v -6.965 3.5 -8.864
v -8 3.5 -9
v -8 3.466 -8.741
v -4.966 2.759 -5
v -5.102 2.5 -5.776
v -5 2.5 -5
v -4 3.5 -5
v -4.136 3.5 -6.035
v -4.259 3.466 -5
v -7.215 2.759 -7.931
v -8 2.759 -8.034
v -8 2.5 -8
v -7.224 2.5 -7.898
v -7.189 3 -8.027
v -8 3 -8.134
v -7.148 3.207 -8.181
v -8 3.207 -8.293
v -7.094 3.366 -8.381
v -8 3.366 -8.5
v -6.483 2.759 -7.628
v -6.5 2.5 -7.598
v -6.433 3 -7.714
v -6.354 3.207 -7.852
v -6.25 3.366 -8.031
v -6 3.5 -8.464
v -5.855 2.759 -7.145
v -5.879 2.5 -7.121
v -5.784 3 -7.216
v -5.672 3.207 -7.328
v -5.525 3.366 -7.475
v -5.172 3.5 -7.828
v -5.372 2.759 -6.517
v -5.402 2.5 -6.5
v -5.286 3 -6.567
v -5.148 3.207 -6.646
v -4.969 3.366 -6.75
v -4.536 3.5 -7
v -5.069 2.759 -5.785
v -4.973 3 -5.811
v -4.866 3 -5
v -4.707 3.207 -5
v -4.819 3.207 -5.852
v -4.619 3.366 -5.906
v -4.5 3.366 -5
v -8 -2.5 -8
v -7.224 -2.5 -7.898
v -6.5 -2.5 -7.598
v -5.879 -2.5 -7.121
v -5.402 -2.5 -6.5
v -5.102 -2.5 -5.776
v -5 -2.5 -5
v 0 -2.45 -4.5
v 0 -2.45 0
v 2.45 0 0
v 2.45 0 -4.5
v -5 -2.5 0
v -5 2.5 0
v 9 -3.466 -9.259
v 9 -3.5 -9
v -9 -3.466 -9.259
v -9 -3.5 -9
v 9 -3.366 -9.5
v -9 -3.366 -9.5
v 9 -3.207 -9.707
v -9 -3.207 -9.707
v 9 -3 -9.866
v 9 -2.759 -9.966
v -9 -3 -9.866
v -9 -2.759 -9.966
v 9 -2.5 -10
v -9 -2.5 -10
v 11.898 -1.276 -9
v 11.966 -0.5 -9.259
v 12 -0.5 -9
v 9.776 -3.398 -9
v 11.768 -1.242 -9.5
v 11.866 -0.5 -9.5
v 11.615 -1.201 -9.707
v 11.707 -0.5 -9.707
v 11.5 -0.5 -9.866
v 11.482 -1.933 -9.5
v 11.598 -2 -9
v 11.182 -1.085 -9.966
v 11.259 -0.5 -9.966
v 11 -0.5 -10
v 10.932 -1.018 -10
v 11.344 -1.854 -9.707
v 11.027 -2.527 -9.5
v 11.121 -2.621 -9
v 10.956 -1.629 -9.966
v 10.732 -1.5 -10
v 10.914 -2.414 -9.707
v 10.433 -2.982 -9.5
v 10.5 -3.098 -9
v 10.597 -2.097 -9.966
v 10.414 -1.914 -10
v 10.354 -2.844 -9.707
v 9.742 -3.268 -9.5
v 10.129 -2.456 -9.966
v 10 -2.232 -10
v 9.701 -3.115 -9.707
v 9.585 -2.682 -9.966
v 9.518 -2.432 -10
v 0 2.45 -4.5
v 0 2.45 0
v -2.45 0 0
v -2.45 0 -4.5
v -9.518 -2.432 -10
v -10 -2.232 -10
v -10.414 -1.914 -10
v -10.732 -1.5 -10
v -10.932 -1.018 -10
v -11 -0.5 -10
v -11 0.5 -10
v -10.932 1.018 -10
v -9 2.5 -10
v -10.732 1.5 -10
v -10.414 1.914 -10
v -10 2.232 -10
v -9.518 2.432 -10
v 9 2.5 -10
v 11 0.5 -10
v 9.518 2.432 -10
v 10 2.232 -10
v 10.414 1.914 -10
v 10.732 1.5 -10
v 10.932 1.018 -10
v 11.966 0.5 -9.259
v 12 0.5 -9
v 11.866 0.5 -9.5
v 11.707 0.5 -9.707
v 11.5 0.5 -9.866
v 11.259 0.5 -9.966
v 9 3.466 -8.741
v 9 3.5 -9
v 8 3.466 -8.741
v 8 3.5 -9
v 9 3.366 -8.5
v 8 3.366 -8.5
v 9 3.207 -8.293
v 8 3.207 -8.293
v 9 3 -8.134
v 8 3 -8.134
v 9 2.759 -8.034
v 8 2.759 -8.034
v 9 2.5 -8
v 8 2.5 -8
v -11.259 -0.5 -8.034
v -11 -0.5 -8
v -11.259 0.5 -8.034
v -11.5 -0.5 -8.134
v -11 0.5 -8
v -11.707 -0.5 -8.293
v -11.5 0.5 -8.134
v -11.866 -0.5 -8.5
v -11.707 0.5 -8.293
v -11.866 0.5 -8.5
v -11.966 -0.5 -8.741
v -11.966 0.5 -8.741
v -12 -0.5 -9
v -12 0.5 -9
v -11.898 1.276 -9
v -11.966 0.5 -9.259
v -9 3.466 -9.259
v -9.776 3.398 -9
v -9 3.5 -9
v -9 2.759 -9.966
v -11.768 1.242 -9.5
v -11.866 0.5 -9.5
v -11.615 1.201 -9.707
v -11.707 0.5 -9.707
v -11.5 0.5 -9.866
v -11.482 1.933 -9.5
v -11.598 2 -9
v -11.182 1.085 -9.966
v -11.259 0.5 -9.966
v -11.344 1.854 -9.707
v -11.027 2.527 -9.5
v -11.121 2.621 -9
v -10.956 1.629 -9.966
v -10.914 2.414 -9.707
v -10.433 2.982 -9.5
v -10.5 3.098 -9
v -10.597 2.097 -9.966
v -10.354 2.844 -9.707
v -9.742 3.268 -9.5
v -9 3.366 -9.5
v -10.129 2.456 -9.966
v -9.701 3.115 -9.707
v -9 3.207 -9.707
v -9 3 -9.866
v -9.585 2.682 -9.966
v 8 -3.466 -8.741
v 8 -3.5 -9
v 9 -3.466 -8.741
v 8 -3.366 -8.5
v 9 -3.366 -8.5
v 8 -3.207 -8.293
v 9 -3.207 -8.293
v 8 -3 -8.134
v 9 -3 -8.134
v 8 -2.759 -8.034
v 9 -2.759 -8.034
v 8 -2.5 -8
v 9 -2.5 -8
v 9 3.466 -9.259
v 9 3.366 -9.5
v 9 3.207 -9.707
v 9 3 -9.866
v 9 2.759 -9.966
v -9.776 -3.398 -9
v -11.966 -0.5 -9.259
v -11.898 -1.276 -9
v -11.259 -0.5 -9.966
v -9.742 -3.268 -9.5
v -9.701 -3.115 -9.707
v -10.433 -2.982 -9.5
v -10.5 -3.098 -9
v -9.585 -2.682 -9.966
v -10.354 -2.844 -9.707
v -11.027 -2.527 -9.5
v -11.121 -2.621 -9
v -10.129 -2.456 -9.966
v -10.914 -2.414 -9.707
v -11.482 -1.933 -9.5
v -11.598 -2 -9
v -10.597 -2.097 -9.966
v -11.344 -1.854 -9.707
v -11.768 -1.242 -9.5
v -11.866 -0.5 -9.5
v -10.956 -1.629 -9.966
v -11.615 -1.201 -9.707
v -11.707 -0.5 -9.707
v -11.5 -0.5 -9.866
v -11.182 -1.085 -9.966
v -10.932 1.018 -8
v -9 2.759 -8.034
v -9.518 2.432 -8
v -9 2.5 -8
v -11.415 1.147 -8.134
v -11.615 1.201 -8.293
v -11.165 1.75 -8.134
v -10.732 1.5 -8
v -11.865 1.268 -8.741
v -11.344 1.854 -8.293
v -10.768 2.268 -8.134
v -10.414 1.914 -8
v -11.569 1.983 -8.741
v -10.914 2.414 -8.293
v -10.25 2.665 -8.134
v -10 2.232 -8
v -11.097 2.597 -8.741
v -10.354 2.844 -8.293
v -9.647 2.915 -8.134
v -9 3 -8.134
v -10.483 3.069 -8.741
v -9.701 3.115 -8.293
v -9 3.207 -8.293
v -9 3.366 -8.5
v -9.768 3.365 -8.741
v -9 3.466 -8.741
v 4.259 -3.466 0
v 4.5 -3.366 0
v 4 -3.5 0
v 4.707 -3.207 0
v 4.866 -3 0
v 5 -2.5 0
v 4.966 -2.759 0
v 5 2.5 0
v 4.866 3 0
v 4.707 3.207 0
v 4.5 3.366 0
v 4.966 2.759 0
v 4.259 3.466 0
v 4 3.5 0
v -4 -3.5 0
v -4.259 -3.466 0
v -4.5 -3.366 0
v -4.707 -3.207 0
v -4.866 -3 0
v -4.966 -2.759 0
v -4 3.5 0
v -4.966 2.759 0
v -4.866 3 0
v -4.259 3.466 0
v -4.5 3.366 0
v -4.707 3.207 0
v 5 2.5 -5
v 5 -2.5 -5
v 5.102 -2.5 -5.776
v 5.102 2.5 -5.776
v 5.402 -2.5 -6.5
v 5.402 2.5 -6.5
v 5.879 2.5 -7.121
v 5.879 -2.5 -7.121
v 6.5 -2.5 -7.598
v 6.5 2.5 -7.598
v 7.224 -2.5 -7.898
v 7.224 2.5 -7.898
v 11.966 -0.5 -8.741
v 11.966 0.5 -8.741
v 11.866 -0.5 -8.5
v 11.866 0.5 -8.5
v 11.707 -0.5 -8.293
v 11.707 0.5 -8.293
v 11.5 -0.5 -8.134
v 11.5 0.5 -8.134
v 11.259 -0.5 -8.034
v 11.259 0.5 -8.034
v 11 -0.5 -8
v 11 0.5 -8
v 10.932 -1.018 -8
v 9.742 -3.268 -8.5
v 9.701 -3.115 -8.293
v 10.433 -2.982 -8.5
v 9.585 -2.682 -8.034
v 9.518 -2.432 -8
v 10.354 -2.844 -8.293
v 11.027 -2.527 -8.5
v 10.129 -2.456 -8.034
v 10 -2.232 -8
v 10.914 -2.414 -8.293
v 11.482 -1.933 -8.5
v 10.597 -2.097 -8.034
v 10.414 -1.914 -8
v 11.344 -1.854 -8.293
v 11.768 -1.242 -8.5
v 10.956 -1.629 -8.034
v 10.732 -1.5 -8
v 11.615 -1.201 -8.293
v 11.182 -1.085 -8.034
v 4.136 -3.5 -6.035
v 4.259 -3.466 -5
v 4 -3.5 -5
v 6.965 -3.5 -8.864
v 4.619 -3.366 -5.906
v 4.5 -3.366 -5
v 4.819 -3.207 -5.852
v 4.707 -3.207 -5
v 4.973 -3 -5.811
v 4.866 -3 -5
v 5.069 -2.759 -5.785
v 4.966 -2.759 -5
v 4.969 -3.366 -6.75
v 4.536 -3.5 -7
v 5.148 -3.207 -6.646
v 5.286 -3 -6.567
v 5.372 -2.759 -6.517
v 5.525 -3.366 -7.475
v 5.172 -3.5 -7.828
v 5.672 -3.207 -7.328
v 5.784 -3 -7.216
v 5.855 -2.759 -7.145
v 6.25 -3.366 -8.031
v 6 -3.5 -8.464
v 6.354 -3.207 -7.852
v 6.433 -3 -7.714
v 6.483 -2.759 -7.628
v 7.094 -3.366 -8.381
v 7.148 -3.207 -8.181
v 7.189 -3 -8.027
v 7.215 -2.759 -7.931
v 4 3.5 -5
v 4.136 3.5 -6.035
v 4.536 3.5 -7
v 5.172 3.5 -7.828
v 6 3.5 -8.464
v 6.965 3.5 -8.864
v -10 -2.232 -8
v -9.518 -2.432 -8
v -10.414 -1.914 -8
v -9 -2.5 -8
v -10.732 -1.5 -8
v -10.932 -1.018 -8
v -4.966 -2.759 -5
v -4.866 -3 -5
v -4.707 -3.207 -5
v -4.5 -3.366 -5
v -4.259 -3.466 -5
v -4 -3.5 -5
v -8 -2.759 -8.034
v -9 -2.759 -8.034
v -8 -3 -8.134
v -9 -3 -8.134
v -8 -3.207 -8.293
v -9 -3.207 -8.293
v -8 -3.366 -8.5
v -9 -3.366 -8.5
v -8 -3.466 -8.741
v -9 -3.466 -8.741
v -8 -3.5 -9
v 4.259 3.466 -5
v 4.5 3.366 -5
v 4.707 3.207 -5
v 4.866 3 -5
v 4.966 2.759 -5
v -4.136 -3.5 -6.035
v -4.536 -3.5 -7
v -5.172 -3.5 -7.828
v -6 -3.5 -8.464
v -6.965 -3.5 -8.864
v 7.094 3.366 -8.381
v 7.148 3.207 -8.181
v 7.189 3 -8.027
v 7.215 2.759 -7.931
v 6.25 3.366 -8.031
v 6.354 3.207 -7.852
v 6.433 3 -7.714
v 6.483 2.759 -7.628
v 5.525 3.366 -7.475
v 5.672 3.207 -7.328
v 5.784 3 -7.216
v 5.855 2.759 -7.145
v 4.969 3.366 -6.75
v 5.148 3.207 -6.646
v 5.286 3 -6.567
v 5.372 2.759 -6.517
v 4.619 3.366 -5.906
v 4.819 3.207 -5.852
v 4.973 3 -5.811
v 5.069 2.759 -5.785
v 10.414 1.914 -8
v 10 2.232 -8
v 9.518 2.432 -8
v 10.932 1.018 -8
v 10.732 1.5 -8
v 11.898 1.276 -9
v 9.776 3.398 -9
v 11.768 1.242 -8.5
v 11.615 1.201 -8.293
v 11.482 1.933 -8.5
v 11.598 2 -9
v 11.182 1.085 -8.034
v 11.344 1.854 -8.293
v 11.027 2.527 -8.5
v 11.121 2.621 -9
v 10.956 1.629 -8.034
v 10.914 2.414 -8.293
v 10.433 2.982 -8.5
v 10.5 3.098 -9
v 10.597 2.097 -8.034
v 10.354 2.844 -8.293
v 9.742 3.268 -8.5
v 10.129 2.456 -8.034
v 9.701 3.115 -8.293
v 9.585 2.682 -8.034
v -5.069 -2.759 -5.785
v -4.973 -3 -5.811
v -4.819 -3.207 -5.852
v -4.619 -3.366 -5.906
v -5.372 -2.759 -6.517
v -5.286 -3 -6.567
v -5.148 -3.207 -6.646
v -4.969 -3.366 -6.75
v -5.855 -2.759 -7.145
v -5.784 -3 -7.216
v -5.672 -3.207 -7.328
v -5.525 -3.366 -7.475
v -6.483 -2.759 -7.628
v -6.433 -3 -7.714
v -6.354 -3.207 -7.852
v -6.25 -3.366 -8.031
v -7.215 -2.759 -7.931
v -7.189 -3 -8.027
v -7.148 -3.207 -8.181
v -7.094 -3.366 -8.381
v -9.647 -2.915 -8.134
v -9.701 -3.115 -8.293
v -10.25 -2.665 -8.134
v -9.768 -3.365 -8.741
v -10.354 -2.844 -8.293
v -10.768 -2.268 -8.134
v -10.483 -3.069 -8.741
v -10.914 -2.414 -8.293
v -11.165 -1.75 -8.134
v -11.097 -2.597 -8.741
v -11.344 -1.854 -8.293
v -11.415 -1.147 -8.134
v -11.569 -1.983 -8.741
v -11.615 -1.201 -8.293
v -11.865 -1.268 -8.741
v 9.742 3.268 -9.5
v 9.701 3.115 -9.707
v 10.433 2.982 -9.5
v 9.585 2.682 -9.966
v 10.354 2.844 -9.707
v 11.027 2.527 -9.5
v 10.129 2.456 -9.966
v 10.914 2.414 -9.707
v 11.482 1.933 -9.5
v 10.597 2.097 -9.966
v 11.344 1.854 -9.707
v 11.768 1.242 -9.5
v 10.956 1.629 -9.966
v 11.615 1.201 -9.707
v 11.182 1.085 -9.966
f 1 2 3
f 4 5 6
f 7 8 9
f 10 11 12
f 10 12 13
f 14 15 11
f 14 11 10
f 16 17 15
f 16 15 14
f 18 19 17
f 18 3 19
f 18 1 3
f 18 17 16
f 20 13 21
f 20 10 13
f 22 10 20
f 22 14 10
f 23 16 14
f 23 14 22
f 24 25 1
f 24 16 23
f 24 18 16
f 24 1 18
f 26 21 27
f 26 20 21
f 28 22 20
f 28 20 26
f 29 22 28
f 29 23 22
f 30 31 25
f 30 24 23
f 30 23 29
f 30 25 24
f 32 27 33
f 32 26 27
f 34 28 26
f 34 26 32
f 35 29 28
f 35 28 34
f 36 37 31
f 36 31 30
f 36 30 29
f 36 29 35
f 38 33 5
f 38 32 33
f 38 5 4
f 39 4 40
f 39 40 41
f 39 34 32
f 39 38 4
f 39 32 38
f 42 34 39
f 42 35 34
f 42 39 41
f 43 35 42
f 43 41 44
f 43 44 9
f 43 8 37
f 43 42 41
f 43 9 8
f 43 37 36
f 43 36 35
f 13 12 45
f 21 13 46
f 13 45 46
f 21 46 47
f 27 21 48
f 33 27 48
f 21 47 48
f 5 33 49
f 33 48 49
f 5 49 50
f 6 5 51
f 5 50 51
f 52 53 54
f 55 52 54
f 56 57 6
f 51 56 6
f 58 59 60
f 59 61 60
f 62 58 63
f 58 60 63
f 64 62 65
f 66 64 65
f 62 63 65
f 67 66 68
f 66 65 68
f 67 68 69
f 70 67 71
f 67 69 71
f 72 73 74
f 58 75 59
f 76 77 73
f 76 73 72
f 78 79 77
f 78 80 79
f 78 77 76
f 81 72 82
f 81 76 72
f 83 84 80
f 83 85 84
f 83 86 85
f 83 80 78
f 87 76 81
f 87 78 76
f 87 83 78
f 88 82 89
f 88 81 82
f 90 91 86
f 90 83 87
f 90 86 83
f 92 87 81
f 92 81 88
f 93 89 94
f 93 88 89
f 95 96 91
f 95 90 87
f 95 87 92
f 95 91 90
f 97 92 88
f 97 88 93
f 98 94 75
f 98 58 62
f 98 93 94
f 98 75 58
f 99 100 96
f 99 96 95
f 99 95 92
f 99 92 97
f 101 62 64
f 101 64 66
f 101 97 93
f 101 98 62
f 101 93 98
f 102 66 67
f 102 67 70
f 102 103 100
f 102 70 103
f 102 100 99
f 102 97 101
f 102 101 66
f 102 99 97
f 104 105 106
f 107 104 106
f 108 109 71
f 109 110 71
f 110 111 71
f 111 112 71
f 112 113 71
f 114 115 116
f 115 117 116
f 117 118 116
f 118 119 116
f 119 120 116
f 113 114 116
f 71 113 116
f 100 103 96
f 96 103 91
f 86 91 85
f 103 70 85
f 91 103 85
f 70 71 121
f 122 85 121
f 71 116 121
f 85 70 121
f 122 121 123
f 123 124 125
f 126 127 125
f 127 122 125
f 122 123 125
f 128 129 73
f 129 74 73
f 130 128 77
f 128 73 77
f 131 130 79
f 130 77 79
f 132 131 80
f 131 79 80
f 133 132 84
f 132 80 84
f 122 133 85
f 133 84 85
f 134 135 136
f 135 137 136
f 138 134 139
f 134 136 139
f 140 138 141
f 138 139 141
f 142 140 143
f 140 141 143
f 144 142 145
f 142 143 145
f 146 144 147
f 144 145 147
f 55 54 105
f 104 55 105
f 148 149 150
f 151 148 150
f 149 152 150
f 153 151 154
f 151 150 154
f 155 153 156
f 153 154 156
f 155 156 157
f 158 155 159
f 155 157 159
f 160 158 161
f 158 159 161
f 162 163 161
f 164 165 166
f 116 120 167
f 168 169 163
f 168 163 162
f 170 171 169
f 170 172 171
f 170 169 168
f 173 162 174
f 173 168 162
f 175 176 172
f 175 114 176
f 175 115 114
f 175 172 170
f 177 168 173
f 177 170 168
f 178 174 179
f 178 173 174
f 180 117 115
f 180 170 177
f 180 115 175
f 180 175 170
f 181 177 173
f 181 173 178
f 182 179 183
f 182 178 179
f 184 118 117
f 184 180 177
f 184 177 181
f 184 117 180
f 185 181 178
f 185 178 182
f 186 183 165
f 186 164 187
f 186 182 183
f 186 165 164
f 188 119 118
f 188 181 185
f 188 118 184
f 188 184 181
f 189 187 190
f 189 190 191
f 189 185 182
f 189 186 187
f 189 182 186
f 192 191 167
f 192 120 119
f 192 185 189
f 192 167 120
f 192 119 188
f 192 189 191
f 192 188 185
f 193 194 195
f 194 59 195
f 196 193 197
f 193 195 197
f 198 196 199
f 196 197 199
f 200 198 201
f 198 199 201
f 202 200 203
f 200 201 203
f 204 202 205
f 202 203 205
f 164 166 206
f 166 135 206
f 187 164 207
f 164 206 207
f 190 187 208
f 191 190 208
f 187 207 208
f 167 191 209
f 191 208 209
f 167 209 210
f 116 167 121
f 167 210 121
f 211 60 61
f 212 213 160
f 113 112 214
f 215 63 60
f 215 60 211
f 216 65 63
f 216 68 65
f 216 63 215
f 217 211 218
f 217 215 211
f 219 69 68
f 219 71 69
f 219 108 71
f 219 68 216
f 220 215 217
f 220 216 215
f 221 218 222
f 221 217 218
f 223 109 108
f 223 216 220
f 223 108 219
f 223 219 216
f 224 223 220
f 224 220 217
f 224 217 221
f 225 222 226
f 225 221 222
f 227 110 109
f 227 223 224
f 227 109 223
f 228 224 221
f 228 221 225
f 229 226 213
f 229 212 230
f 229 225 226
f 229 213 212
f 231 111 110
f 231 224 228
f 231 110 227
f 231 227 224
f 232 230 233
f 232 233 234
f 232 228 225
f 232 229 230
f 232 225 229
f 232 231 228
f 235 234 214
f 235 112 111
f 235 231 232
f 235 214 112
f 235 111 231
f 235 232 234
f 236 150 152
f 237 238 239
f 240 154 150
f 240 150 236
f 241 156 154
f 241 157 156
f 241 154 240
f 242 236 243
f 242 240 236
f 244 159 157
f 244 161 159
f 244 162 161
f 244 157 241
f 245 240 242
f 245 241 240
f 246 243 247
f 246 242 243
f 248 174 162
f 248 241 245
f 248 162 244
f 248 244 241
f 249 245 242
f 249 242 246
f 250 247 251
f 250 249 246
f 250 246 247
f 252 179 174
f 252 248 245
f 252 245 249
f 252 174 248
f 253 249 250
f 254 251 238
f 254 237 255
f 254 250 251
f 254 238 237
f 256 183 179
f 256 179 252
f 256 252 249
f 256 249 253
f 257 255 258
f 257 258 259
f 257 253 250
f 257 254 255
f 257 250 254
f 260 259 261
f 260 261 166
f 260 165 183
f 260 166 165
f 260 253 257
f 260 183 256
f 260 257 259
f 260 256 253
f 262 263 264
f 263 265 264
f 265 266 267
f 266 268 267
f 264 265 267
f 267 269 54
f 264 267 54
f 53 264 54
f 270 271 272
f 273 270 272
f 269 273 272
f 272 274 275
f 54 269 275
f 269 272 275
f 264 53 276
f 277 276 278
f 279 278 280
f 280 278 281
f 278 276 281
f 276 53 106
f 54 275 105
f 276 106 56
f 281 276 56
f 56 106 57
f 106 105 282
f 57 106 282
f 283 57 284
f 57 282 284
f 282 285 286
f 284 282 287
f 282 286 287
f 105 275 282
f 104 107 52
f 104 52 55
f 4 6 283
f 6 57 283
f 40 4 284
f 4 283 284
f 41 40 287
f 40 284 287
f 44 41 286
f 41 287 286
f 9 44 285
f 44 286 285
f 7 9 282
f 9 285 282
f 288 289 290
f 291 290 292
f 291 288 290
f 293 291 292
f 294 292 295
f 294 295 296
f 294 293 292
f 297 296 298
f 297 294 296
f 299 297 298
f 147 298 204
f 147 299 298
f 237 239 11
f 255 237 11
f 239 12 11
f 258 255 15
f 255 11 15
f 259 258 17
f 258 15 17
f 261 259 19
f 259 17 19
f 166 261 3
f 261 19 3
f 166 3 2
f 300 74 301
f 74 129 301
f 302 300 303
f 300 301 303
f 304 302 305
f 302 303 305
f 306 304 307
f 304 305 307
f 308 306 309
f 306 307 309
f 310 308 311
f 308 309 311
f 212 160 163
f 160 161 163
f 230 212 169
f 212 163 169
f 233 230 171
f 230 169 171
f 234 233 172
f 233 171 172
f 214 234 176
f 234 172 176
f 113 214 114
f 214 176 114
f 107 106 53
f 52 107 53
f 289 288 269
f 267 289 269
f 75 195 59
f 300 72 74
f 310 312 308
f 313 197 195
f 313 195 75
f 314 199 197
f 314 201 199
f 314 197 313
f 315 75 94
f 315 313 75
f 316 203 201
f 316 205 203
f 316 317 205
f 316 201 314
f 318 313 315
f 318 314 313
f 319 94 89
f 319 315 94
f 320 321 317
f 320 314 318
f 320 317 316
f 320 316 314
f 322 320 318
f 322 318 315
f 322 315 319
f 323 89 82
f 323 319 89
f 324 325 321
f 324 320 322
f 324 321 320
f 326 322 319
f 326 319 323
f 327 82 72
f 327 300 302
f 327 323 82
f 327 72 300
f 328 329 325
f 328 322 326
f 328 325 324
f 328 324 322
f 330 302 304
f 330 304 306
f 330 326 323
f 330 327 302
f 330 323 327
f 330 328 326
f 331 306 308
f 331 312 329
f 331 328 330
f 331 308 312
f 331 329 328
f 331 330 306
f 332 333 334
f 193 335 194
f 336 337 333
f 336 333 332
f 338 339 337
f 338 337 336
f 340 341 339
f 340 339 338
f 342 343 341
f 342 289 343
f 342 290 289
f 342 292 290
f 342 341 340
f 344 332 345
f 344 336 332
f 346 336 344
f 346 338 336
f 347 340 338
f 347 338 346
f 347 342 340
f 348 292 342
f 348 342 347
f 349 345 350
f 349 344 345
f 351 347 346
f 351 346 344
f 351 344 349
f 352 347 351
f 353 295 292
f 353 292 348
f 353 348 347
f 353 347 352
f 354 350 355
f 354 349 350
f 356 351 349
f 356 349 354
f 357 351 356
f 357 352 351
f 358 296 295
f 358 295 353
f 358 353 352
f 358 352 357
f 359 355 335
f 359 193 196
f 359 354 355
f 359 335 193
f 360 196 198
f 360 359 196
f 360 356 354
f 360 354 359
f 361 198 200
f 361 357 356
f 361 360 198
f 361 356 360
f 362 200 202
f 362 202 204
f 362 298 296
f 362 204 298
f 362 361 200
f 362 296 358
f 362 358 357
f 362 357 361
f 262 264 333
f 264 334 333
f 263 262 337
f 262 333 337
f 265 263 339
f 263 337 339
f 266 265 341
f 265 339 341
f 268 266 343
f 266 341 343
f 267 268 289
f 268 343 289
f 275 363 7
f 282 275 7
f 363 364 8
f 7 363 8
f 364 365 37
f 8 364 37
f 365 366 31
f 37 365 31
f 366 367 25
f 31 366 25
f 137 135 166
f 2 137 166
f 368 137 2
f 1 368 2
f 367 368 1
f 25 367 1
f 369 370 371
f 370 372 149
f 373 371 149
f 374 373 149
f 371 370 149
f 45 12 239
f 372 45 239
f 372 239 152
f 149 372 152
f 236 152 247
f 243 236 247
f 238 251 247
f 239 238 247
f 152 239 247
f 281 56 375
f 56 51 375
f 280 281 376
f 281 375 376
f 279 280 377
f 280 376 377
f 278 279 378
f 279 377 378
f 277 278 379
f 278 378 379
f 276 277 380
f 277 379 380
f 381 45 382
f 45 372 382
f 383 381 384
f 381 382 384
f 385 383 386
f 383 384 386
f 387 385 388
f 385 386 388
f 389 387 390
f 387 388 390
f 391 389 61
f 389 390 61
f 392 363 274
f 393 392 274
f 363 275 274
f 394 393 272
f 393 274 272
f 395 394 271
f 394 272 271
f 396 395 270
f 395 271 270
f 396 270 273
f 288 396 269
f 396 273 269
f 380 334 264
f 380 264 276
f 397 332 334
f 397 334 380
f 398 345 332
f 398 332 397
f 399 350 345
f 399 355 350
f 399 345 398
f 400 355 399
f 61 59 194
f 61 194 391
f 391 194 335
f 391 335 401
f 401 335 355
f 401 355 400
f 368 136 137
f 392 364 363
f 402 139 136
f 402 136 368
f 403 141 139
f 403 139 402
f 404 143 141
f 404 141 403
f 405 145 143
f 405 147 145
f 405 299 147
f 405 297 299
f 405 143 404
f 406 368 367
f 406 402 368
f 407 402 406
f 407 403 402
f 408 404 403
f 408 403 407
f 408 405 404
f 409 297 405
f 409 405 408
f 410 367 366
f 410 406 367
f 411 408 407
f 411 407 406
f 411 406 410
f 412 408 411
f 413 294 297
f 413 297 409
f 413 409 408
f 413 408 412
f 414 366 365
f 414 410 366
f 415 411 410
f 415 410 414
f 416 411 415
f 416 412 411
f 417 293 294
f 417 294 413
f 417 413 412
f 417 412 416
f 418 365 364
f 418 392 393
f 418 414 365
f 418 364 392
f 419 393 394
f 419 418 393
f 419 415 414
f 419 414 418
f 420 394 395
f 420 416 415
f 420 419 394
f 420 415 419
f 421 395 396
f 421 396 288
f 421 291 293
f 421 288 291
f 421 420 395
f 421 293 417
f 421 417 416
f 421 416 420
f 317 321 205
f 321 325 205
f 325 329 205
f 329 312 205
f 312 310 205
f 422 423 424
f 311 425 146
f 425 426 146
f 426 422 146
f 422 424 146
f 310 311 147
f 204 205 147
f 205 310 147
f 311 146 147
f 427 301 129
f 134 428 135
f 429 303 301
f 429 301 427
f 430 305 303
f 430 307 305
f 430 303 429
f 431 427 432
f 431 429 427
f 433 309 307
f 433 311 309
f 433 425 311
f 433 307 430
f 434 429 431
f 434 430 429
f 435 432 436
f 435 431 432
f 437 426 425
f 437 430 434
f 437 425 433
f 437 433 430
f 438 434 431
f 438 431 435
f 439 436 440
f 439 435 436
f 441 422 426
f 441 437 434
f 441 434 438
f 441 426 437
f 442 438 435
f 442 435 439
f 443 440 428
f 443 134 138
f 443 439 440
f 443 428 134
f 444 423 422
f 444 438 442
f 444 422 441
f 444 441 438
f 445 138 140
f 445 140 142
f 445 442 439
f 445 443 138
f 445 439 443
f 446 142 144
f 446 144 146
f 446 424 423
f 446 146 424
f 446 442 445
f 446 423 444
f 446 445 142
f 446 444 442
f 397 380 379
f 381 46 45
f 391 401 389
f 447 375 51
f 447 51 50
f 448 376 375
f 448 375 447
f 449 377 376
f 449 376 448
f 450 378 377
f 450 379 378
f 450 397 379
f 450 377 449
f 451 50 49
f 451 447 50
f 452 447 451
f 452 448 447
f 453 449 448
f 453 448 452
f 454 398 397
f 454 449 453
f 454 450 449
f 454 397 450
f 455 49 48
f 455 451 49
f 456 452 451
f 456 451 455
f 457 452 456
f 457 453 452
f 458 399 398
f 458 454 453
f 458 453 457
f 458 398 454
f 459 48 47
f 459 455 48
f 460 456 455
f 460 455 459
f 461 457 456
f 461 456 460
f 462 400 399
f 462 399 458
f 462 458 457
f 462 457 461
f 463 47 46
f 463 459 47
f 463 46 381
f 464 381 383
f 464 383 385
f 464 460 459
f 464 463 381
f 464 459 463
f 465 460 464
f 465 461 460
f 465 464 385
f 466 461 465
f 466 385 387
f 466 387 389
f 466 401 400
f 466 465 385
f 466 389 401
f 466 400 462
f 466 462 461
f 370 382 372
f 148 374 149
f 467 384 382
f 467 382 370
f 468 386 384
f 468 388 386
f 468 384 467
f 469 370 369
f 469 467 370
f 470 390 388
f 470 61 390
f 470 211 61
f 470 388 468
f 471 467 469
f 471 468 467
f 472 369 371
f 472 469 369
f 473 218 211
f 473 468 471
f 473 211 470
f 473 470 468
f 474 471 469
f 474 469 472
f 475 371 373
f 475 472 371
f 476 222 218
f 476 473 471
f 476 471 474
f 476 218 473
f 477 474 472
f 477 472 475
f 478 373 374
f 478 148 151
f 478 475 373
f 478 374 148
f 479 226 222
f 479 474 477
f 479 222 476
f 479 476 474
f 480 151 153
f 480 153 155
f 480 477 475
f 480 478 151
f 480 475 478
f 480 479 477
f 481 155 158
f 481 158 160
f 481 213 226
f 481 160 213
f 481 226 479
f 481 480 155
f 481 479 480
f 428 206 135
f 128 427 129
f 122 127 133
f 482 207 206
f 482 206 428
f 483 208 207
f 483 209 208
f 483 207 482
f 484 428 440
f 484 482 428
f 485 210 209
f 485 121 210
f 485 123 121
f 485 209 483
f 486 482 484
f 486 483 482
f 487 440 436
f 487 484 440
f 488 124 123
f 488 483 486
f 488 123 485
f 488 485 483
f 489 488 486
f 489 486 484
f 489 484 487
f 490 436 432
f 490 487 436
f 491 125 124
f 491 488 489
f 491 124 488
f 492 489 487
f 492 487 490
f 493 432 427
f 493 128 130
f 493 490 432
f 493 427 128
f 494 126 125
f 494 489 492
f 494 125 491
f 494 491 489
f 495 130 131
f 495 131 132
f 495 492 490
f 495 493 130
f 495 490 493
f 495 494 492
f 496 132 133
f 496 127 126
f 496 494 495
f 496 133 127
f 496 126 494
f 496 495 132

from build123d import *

# Parameters (mm, degrees)
BOSS_EXTRUDE1_DEPTH = 3.5
FILLET1_R           = 3
FILLET2_R           = 3
FILLET3_R           = 1
CUT_EXTRUDE1_DEPTH  = 4.5


with BuildPart() as part:
    # Sketch1 → Boss-Extrude1 (new, symmetric)
    with BuildSketch(Plane(origin=(0, 0, 0), x_dir=(1, 0, 0), z_dir=(0, 1, 0))):
        Polygon((5, 0), (-5, 0), (-5, 8), (-12, 8), (-12, 10), (12, 10), (12, 8), (5, 8), align=None)
    extrude(amount=BOSS_EXTRUDE1_DEPTH, both=True)

    # Fillet1
    fillet1_edges = [part.edges().sort_by_distance(p)[0] for p in [
        (12, 3.5, -9),
        (-12, 3.5, -9),
        (-12, -3.5, -9),
        (12, -3.5, -9),
    ]]
    fillet(fillet1_edges, radius=FILLET1_R)

    # Fillet2
    fillet2_edges = [part.edges().sort_by_distance(p)[0] for p in [
        (-5, 0, -8),
        (5, 0, -8),
    ]]
    fillet(fillet2_edges, radius=FILLET2_R)

    # Fillet3
    fillet3_edges = [part.edges().sort_by_distance(p)[0] for p in [
        (5, 3.5, -2.5),
        (5, -3.5, -2.5),
        (5.878679656, -3.5, -7.121320344),
        (11.121320344, -2.621320344, -8),
        (11.121320344, 2.621320344, -8),
        (-5, -3.5, -2.5),
        (-5.878679656, -3.5, -7.121320344),
        (-11.121320344, -2.621320344, -8),
        (-11.121320344, 2.621320344, -8),
        (-5, 3.5, -2.5),
        (5.878679656, 3.5, -7.121320344),
        (-5.878679656, 3.5, -7.121320344),
        (0, 3.5, -10),
        (-11.121320344, 2.621320344, -10),
        (-11.121320344, -2.621320344, -10),
        (0, -3.5, -10),
        (11.121320344, -2.621320344, -10),
        (11.121320344, 2.621320344, -10),
        (12, 0, -8),
        (-12, 0, -8),
        (12, 0, -10),
        (-12, 0, -10),
        (8.5, -3.5, -8),
        (8.5, 3.5, -8),
        (-8.5, -3.5, -8),
        (-8.5, 3.5, -8),
    ]]
    fillet(fillet3_edges, radius=FILLET3_R - 0.0001)  # a hair under: the kernel refuses the full size

    # Sketch3 → Cut-Extrude1 (cut)
    with BuildSketch(Plane.XY):
        Polygon((2.45, 0), (0, 2.45), (-2.45, 0), (0, -2.45), align=None)
    extrude(amount=-CUT_EXTRUDE1_DEPTH, mode=Mode.SUBTRACT)


solid = part.part
